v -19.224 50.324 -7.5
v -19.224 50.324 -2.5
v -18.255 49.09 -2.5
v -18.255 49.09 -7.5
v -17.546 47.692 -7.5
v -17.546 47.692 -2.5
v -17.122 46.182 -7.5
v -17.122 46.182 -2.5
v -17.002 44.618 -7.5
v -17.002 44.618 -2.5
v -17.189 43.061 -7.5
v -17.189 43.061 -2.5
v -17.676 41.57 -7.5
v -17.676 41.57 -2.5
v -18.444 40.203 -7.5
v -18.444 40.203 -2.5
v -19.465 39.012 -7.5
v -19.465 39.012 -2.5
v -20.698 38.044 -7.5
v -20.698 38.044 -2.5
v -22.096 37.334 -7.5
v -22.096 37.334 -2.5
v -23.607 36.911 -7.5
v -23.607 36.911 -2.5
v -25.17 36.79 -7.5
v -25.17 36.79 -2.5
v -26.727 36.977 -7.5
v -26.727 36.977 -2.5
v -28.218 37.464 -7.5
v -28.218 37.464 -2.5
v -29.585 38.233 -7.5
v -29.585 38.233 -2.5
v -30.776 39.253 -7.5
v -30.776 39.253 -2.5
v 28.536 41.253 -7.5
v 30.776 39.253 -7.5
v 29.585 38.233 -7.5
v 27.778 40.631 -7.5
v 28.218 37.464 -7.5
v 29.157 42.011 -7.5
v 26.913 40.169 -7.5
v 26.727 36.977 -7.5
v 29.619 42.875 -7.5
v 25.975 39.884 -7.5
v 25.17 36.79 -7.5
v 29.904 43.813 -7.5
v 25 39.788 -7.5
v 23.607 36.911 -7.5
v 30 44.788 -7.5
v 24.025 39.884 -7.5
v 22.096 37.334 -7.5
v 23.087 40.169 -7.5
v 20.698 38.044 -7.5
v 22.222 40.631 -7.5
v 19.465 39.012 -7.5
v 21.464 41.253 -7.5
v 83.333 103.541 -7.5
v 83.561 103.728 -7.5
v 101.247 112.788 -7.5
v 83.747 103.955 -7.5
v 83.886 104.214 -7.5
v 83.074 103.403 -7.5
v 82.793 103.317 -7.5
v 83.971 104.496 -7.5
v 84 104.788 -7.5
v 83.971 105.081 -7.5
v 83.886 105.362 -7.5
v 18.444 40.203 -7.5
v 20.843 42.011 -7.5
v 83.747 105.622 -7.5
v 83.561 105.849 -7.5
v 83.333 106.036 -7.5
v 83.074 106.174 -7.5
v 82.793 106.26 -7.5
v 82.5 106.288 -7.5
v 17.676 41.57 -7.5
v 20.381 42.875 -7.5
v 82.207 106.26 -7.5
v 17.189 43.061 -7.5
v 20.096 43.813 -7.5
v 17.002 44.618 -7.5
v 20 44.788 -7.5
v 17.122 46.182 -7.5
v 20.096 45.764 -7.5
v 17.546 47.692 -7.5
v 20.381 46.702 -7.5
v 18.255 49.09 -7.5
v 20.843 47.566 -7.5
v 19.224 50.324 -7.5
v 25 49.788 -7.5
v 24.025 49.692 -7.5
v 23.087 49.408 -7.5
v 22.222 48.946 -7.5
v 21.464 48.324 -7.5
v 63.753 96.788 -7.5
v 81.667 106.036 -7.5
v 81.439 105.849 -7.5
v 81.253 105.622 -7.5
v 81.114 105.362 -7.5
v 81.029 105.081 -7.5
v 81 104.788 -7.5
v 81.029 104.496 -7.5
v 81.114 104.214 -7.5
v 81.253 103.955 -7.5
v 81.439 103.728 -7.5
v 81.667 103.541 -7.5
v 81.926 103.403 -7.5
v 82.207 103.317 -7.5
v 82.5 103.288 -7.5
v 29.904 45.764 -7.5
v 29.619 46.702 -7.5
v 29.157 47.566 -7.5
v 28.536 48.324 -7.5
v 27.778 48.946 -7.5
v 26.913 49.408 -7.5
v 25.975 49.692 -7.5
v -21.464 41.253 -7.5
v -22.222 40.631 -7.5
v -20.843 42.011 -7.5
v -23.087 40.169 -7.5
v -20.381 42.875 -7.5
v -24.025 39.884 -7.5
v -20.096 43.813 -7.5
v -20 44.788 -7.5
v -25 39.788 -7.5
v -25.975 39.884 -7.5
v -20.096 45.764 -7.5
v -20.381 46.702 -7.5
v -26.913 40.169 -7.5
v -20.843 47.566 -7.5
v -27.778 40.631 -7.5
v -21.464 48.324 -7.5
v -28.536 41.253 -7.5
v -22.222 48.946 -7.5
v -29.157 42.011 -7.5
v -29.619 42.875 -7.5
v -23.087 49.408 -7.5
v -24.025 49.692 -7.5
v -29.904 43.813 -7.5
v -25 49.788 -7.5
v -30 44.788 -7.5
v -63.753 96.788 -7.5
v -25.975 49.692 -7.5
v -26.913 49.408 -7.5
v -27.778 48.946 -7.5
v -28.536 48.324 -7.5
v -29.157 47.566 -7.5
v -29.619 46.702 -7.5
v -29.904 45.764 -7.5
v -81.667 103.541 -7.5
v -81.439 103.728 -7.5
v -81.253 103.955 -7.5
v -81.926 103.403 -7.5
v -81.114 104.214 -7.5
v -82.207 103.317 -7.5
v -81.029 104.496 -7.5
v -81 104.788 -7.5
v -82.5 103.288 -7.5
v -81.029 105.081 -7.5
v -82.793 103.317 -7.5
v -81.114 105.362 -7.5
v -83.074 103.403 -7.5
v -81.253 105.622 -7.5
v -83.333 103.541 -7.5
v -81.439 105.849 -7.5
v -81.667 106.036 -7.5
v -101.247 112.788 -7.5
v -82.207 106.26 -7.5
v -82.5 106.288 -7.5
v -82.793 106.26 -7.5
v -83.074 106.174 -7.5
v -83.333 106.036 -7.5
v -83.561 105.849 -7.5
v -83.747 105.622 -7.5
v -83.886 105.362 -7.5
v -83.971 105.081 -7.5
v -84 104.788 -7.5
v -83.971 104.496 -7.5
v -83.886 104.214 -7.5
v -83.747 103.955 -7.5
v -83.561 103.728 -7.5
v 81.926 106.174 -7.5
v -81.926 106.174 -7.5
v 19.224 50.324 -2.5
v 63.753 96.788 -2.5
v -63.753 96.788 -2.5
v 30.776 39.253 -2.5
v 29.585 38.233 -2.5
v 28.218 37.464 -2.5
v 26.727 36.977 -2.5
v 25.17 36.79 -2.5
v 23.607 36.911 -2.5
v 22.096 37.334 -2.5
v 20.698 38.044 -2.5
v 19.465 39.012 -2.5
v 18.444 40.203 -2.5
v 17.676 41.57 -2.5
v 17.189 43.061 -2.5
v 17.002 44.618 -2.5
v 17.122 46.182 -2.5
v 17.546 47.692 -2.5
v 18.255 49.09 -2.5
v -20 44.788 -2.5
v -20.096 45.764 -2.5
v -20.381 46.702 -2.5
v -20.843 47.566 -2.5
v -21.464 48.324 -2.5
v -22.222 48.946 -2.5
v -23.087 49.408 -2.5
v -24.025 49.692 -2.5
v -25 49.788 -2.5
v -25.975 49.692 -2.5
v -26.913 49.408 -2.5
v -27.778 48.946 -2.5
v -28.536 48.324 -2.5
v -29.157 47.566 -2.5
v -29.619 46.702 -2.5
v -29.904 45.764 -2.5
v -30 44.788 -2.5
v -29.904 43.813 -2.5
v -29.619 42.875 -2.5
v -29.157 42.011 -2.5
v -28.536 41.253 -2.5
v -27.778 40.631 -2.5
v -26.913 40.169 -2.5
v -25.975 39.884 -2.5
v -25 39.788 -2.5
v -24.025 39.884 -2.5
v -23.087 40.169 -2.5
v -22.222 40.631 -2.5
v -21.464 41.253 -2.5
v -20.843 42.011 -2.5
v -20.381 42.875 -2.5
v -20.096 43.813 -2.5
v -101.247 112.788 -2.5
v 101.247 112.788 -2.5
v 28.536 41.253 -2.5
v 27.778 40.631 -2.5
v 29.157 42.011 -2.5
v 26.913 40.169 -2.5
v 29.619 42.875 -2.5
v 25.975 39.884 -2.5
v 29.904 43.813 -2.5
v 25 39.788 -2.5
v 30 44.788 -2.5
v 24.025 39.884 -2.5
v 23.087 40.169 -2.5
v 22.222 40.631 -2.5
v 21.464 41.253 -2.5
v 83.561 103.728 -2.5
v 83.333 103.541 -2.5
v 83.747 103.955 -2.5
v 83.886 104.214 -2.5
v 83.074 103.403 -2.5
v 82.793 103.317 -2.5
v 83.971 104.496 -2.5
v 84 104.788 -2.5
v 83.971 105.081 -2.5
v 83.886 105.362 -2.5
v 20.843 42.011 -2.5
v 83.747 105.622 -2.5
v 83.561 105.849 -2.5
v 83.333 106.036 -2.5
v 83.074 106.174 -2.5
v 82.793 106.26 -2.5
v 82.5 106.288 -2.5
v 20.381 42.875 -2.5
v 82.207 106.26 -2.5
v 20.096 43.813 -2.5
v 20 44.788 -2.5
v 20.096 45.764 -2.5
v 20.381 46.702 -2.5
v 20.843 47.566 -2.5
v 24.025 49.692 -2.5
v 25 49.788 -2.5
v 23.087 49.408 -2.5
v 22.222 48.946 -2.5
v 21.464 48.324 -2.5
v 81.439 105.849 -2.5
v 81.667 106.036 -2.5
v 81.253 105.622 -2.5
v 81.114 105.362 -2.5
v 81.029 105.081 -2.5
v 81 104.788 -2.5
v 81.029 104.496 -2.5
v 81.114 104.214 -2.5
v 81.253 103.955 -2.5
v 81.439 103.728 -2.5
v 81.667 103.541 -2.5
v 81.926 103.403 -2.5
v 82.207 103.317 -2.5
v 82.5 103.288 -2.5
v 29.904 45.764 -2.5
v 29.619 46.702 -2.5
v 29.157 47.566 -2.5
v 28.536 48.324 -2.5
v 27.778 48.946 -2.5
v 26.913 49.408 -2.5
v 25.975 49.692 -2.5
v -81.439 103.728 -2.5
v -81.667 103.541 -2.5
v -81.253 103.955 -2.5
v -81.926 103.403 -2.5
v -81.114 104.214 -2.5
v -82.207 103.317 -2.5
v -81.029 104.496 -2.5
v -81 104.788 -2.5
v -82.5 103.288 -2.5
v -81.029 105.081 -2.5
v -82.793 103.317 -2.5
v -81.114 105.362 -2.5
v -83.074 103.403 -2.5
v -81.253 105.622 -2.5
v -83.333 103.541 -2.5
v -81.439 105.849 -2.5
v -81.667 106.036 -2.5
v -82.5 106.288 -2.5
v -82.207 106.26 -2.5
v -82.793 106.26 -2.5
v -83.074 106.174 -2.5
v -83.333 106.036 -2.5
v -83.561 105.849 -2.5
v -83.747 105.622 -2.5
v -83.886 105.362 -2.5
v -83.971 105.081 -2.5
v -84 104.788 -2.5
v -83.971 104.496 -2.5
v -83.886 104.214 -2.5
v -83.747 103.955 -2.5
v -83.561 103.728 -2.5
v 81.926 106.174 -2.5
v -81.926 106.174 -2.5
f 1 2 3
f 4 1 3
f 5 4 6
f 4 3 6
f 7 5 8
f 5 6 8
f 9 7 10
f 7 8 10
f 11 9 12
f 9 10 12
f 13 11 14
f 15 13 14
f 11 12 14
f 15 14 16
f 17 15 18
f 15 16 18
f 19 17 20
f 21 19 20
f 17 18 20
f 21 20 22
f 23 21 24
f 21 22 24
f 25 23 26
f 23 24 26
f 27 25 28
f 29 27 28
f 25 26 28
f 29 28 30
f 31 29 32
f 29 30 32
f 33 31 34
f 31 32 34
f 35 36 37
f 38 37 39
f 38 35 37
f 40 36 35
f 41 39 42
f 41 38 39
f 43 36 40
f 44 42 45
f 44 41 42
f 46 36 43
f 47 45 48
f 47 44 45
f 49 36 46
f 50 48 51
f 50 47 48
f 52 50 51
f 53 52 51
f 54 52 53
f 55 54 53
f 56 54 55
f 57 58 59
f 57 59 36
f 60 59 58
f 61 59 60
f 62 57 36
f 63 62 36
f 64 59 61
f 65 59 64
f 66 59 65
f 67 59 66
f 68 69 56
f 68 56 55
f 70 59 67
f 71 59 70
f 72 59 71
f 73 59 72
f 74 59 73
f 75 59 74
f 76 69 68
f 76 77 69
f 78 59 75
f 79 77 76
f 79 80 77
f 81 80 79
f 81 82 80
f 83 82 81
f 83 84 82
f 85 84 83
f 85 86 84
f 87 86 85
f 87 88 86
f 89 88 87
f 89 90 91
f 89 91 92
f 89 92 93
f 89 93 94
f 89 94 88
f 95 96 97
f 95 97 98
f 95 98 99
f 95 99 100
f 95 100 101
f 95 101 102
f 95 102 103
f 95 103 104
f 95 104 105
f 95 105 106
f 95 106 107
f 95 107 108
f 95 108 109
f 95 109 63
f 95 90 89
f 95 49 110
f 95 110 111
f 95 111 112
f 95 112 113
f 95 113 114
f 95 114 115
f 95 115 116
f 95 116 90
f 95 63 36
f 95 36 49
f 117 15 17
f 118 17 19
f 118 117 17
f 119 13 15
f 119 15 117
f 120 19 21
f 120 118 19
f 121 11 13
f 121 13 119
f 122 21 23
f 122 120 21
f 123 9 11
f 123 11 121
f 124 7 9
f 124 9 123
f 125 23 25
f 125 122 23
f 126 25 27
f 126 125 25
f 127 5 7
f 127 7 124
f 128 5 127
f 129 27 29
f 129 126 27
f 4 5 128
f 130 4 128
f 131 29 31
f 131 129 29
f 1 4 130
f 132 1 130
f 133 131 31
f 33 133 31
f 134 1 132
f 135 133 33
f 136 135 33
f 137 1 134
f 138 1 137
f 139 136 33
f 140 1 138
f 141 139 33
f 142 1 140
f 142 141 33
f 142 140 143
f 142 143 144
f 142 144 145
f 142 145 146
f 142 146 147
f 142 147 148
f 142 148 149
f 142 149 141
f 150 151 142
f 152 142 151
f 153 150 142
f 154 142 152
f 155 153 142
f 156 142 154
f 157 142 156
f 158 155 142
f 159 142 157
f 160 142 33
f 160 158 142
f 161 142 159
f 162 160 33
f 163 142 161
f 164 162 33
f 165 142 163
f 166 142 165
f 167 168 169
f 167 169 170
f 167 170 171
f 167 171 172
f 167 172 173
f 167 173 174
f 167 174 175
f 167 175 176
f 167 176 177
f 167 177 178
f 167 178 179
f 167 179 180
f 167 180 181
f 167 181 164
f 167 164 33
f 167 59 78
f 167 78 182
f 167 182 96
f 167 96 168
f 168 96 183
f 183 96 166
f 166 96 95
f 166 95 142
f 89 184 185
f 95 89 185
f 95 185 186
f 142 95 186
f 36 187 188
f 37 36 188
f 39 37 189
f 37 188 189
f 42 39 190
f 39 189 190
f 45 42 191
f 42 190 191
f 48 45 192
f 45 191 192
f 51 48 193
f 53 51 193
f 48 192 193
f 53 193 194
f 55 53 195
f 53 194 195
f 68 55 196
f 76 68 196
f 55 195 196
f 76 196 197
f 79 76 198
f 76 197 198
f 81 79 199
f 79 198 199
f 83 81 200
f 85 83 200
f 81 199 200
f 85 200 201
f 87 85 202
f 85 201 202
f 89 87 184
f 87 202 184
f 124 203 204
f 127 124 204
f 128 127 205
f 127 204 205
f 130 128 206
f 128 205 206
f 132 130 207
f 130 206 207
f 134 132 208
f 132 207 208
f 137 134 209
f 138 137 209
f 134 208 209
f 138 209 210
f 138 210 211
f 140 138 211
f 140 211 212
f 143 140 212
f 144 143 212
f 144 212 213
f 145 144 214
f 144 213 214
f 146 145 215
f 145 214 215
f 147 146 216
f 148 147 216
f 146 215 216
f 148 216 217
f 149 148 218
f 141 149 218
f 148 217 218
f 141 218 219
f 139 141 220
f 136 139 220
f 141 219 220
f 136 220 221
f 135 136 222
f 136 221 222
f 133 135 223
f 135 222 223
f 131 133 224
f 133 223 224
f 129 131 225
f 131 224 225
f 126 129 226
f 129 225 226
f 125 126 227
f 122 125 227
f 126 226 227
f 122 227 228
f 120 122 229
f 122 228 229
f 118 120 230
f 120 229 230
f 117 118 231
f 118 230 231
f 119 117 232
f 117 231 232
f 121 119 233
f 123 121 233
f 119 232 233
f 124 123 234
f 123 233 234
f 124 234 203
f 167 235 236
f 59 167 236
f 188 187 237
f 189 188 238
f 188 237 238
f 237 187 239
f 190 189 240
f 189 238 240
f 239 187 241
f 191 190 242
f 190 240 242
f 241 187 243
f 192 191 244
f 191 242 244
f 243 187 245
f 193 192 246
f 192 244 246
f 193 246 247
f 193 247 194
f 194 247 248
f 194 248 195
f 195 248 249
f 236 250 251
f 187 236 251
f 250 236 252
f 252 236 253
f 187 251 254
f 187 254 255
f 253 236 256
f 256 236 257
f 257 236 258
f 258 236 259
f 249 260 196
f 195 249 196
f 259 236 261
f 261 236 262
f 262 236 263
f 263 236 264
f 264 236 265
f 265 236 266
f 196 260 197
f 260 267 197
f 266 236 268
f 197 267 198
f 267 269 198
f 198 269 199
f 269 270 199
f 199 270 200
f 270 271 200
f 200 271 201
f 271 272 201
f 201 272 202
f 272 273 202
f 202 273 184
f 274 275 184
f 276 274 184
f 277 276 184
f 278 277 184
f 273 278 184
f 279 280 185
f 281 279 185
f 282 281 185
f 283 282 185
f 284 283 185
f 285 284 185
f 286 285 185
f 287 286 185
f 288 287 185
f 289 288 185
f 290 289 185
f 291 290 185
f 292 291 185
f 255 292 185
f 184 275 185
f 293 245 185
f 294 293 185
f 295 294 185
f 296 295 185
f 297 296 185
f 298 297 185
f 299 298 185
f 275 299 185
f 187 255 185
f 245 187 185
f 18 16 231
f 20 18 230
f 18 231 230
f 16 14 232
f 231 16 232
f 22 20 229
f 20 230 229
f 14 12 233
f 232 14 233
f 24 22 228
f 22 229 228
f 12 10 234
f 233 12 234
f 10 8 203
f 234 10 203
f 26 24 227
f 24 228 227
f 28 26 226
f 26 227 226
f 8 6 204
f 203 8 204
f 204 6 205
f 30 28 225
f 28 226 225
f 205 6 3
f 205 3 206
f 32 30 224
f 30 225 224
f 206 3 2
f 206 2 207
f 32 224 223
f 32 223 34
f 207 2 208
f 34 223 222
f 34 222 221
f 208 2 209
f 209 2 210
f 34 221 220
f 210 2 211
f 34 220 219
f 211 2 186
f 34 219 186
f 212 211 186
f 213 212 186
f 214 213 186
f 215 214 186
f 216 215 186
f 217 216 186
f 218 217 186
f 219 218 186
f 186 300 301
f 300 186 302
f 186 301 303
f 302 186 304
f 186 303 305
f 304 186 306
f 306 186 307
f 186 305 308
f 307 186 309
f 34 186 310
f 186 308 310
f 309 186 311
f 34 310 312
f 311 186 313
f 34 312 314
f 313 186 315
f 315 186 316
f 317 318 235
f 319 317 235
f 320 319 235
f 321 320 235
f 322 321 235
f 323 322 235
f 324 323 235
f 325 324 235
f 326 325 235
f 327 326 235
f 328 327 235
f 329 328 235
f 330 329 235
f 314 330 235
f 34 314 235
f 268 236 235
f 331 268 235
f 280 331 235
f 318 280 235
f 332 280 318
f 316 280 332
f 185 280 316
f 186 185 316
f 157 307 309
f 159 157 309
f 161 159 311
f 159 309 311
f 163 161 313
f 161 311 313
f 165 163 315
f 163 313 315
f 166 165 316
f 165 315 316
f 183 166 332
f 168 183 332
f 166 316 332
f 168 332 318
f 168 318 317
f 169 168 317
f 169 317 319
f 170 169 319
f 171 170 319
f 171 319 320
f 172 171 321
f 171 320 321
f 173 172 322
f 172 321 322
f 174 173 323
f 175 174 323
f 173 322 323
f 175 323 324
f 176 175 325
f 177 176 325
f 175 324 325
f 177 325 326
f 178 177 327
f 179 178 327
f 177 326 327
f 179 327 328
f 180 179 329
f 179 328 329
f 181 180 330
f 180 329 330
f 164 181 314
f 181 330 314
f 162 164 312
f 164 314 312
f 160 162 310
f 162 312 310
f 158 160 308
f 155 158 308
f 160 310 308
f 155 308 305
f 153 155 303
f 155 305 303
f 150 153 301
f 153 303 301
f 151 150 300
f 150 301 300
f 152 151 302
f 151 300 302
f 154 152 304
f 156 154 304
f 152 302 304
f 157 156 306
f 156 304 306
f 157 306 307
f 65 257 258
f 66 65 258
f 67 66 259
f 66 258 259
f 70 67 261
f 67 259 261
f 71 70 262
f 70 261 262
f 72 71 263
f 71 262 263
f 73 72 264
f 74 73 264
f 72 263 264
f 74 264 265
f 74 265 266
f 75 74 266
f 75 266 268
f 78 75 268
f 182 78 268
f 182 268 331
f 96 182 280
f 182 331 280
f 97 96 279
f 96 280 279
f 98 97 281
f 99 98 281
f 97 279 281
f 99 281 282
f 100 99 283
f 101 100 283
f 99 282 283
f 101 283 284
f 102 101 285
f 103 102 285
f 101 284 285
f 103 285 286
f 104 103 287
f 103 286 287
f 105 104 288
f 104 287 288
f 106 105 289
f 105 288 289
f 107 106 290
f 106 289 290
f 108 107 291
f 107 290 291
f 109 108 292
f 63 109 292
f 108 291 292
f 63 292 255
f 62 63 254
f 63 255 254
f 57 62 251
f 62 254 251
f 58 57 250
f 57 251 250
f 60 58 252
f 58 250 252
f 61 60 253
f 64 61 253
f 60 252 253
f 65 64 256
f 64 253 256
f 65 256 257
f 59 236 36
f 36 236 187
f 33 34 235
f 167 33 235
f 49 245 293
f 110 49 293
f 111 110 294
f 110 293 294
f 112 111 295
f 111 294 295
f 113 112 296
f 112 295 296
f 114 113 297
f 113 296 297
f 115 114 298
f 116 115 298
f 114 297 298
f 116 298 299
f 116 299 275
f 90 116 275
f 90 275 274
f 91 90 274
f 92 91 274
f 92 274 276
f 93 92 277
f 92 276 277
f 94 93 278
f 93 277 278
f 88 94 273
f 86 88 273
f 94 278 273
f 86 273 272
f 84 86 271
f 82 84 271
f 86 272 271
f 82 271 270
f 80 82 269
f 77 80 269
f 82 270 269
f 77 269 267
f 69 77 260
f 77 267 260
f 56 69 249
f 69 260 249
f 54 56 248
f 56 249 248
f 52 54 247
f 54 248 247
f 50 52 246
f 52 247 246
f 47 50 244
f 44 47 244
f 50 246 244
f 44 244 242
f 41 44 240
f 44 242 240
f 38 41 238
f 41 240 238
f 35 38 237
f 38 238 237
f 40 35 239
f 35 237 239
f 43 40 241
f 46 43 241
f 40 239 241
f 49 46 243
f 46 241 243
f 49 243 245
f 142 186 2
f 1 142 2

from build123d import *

# Parameters (mm, degrees)
BOSS_EXTRUDE9_DEPTH = 10
SKETCH2_6_R         = 3
SKETCH2_6_R_2       = 10
CUT_EXTRUDE1_DEPTH  = 10
SCALE1_SCALE        = 0.5


with BuildPart() as part:
    # Sketch2 → Boss-Extrude9 (new body)
    with BuildSketch(Plane.XY):
        with BuildLine():
            Line((-127.505639815, 104), (-38.448188718, 11.070485812))
            ThreePointArc((-38.448188718, 11.070485812), (-38.929514188, -11.551811282), (-61.551811282, -11.070485812))
            Line((-61.551811282, -11.070485812), (-202.494360185, 136))
            Line((-202.494360185, 136), (202.494360185, 136))
            Line((202.494360185, 136), (61.551811282, -11.070485812))
            ThreePointArc((61.551811282, -11.070485812), (38.929514188, -11.551811282), (38.448188718, 11.070485812))
            Line((38.448188718, 11.070485812), (127.505639815, 104))
            Line((127.505639815, 104), (-127.505639815, 104))
        make_face()
    extrude(amount=-BOSS_EXTRUDE9_DEPTH)

    # Sketch2<6> → Cut-Extrude1 (cut)
    with BuildSketch(Plane.XY):
        with Locations((-165, 120)):
            Circle(SKETCH2_6_R)
        with Locations((165, 120)):
            Circle(SKETCH2_6_R)
        with Locations((-50, 0)):
            Circle(SKETCH2_6_R_2)
        with Locations((50, 0)):
            Circle(SKETCH2_6_R_2)
    extrude(amount=-CUT_EXTRUDE1_DEPTH, mode=Mode.SUBTRACT)


with BuildPart() as part_1:
    # Scale1: scaled about (0, 89.576748788, -5)
    add(part.part.scale(SCALE1_SCALE).moved(Location((0, 44.788374394, -2.5))))


solid = part_1.part
